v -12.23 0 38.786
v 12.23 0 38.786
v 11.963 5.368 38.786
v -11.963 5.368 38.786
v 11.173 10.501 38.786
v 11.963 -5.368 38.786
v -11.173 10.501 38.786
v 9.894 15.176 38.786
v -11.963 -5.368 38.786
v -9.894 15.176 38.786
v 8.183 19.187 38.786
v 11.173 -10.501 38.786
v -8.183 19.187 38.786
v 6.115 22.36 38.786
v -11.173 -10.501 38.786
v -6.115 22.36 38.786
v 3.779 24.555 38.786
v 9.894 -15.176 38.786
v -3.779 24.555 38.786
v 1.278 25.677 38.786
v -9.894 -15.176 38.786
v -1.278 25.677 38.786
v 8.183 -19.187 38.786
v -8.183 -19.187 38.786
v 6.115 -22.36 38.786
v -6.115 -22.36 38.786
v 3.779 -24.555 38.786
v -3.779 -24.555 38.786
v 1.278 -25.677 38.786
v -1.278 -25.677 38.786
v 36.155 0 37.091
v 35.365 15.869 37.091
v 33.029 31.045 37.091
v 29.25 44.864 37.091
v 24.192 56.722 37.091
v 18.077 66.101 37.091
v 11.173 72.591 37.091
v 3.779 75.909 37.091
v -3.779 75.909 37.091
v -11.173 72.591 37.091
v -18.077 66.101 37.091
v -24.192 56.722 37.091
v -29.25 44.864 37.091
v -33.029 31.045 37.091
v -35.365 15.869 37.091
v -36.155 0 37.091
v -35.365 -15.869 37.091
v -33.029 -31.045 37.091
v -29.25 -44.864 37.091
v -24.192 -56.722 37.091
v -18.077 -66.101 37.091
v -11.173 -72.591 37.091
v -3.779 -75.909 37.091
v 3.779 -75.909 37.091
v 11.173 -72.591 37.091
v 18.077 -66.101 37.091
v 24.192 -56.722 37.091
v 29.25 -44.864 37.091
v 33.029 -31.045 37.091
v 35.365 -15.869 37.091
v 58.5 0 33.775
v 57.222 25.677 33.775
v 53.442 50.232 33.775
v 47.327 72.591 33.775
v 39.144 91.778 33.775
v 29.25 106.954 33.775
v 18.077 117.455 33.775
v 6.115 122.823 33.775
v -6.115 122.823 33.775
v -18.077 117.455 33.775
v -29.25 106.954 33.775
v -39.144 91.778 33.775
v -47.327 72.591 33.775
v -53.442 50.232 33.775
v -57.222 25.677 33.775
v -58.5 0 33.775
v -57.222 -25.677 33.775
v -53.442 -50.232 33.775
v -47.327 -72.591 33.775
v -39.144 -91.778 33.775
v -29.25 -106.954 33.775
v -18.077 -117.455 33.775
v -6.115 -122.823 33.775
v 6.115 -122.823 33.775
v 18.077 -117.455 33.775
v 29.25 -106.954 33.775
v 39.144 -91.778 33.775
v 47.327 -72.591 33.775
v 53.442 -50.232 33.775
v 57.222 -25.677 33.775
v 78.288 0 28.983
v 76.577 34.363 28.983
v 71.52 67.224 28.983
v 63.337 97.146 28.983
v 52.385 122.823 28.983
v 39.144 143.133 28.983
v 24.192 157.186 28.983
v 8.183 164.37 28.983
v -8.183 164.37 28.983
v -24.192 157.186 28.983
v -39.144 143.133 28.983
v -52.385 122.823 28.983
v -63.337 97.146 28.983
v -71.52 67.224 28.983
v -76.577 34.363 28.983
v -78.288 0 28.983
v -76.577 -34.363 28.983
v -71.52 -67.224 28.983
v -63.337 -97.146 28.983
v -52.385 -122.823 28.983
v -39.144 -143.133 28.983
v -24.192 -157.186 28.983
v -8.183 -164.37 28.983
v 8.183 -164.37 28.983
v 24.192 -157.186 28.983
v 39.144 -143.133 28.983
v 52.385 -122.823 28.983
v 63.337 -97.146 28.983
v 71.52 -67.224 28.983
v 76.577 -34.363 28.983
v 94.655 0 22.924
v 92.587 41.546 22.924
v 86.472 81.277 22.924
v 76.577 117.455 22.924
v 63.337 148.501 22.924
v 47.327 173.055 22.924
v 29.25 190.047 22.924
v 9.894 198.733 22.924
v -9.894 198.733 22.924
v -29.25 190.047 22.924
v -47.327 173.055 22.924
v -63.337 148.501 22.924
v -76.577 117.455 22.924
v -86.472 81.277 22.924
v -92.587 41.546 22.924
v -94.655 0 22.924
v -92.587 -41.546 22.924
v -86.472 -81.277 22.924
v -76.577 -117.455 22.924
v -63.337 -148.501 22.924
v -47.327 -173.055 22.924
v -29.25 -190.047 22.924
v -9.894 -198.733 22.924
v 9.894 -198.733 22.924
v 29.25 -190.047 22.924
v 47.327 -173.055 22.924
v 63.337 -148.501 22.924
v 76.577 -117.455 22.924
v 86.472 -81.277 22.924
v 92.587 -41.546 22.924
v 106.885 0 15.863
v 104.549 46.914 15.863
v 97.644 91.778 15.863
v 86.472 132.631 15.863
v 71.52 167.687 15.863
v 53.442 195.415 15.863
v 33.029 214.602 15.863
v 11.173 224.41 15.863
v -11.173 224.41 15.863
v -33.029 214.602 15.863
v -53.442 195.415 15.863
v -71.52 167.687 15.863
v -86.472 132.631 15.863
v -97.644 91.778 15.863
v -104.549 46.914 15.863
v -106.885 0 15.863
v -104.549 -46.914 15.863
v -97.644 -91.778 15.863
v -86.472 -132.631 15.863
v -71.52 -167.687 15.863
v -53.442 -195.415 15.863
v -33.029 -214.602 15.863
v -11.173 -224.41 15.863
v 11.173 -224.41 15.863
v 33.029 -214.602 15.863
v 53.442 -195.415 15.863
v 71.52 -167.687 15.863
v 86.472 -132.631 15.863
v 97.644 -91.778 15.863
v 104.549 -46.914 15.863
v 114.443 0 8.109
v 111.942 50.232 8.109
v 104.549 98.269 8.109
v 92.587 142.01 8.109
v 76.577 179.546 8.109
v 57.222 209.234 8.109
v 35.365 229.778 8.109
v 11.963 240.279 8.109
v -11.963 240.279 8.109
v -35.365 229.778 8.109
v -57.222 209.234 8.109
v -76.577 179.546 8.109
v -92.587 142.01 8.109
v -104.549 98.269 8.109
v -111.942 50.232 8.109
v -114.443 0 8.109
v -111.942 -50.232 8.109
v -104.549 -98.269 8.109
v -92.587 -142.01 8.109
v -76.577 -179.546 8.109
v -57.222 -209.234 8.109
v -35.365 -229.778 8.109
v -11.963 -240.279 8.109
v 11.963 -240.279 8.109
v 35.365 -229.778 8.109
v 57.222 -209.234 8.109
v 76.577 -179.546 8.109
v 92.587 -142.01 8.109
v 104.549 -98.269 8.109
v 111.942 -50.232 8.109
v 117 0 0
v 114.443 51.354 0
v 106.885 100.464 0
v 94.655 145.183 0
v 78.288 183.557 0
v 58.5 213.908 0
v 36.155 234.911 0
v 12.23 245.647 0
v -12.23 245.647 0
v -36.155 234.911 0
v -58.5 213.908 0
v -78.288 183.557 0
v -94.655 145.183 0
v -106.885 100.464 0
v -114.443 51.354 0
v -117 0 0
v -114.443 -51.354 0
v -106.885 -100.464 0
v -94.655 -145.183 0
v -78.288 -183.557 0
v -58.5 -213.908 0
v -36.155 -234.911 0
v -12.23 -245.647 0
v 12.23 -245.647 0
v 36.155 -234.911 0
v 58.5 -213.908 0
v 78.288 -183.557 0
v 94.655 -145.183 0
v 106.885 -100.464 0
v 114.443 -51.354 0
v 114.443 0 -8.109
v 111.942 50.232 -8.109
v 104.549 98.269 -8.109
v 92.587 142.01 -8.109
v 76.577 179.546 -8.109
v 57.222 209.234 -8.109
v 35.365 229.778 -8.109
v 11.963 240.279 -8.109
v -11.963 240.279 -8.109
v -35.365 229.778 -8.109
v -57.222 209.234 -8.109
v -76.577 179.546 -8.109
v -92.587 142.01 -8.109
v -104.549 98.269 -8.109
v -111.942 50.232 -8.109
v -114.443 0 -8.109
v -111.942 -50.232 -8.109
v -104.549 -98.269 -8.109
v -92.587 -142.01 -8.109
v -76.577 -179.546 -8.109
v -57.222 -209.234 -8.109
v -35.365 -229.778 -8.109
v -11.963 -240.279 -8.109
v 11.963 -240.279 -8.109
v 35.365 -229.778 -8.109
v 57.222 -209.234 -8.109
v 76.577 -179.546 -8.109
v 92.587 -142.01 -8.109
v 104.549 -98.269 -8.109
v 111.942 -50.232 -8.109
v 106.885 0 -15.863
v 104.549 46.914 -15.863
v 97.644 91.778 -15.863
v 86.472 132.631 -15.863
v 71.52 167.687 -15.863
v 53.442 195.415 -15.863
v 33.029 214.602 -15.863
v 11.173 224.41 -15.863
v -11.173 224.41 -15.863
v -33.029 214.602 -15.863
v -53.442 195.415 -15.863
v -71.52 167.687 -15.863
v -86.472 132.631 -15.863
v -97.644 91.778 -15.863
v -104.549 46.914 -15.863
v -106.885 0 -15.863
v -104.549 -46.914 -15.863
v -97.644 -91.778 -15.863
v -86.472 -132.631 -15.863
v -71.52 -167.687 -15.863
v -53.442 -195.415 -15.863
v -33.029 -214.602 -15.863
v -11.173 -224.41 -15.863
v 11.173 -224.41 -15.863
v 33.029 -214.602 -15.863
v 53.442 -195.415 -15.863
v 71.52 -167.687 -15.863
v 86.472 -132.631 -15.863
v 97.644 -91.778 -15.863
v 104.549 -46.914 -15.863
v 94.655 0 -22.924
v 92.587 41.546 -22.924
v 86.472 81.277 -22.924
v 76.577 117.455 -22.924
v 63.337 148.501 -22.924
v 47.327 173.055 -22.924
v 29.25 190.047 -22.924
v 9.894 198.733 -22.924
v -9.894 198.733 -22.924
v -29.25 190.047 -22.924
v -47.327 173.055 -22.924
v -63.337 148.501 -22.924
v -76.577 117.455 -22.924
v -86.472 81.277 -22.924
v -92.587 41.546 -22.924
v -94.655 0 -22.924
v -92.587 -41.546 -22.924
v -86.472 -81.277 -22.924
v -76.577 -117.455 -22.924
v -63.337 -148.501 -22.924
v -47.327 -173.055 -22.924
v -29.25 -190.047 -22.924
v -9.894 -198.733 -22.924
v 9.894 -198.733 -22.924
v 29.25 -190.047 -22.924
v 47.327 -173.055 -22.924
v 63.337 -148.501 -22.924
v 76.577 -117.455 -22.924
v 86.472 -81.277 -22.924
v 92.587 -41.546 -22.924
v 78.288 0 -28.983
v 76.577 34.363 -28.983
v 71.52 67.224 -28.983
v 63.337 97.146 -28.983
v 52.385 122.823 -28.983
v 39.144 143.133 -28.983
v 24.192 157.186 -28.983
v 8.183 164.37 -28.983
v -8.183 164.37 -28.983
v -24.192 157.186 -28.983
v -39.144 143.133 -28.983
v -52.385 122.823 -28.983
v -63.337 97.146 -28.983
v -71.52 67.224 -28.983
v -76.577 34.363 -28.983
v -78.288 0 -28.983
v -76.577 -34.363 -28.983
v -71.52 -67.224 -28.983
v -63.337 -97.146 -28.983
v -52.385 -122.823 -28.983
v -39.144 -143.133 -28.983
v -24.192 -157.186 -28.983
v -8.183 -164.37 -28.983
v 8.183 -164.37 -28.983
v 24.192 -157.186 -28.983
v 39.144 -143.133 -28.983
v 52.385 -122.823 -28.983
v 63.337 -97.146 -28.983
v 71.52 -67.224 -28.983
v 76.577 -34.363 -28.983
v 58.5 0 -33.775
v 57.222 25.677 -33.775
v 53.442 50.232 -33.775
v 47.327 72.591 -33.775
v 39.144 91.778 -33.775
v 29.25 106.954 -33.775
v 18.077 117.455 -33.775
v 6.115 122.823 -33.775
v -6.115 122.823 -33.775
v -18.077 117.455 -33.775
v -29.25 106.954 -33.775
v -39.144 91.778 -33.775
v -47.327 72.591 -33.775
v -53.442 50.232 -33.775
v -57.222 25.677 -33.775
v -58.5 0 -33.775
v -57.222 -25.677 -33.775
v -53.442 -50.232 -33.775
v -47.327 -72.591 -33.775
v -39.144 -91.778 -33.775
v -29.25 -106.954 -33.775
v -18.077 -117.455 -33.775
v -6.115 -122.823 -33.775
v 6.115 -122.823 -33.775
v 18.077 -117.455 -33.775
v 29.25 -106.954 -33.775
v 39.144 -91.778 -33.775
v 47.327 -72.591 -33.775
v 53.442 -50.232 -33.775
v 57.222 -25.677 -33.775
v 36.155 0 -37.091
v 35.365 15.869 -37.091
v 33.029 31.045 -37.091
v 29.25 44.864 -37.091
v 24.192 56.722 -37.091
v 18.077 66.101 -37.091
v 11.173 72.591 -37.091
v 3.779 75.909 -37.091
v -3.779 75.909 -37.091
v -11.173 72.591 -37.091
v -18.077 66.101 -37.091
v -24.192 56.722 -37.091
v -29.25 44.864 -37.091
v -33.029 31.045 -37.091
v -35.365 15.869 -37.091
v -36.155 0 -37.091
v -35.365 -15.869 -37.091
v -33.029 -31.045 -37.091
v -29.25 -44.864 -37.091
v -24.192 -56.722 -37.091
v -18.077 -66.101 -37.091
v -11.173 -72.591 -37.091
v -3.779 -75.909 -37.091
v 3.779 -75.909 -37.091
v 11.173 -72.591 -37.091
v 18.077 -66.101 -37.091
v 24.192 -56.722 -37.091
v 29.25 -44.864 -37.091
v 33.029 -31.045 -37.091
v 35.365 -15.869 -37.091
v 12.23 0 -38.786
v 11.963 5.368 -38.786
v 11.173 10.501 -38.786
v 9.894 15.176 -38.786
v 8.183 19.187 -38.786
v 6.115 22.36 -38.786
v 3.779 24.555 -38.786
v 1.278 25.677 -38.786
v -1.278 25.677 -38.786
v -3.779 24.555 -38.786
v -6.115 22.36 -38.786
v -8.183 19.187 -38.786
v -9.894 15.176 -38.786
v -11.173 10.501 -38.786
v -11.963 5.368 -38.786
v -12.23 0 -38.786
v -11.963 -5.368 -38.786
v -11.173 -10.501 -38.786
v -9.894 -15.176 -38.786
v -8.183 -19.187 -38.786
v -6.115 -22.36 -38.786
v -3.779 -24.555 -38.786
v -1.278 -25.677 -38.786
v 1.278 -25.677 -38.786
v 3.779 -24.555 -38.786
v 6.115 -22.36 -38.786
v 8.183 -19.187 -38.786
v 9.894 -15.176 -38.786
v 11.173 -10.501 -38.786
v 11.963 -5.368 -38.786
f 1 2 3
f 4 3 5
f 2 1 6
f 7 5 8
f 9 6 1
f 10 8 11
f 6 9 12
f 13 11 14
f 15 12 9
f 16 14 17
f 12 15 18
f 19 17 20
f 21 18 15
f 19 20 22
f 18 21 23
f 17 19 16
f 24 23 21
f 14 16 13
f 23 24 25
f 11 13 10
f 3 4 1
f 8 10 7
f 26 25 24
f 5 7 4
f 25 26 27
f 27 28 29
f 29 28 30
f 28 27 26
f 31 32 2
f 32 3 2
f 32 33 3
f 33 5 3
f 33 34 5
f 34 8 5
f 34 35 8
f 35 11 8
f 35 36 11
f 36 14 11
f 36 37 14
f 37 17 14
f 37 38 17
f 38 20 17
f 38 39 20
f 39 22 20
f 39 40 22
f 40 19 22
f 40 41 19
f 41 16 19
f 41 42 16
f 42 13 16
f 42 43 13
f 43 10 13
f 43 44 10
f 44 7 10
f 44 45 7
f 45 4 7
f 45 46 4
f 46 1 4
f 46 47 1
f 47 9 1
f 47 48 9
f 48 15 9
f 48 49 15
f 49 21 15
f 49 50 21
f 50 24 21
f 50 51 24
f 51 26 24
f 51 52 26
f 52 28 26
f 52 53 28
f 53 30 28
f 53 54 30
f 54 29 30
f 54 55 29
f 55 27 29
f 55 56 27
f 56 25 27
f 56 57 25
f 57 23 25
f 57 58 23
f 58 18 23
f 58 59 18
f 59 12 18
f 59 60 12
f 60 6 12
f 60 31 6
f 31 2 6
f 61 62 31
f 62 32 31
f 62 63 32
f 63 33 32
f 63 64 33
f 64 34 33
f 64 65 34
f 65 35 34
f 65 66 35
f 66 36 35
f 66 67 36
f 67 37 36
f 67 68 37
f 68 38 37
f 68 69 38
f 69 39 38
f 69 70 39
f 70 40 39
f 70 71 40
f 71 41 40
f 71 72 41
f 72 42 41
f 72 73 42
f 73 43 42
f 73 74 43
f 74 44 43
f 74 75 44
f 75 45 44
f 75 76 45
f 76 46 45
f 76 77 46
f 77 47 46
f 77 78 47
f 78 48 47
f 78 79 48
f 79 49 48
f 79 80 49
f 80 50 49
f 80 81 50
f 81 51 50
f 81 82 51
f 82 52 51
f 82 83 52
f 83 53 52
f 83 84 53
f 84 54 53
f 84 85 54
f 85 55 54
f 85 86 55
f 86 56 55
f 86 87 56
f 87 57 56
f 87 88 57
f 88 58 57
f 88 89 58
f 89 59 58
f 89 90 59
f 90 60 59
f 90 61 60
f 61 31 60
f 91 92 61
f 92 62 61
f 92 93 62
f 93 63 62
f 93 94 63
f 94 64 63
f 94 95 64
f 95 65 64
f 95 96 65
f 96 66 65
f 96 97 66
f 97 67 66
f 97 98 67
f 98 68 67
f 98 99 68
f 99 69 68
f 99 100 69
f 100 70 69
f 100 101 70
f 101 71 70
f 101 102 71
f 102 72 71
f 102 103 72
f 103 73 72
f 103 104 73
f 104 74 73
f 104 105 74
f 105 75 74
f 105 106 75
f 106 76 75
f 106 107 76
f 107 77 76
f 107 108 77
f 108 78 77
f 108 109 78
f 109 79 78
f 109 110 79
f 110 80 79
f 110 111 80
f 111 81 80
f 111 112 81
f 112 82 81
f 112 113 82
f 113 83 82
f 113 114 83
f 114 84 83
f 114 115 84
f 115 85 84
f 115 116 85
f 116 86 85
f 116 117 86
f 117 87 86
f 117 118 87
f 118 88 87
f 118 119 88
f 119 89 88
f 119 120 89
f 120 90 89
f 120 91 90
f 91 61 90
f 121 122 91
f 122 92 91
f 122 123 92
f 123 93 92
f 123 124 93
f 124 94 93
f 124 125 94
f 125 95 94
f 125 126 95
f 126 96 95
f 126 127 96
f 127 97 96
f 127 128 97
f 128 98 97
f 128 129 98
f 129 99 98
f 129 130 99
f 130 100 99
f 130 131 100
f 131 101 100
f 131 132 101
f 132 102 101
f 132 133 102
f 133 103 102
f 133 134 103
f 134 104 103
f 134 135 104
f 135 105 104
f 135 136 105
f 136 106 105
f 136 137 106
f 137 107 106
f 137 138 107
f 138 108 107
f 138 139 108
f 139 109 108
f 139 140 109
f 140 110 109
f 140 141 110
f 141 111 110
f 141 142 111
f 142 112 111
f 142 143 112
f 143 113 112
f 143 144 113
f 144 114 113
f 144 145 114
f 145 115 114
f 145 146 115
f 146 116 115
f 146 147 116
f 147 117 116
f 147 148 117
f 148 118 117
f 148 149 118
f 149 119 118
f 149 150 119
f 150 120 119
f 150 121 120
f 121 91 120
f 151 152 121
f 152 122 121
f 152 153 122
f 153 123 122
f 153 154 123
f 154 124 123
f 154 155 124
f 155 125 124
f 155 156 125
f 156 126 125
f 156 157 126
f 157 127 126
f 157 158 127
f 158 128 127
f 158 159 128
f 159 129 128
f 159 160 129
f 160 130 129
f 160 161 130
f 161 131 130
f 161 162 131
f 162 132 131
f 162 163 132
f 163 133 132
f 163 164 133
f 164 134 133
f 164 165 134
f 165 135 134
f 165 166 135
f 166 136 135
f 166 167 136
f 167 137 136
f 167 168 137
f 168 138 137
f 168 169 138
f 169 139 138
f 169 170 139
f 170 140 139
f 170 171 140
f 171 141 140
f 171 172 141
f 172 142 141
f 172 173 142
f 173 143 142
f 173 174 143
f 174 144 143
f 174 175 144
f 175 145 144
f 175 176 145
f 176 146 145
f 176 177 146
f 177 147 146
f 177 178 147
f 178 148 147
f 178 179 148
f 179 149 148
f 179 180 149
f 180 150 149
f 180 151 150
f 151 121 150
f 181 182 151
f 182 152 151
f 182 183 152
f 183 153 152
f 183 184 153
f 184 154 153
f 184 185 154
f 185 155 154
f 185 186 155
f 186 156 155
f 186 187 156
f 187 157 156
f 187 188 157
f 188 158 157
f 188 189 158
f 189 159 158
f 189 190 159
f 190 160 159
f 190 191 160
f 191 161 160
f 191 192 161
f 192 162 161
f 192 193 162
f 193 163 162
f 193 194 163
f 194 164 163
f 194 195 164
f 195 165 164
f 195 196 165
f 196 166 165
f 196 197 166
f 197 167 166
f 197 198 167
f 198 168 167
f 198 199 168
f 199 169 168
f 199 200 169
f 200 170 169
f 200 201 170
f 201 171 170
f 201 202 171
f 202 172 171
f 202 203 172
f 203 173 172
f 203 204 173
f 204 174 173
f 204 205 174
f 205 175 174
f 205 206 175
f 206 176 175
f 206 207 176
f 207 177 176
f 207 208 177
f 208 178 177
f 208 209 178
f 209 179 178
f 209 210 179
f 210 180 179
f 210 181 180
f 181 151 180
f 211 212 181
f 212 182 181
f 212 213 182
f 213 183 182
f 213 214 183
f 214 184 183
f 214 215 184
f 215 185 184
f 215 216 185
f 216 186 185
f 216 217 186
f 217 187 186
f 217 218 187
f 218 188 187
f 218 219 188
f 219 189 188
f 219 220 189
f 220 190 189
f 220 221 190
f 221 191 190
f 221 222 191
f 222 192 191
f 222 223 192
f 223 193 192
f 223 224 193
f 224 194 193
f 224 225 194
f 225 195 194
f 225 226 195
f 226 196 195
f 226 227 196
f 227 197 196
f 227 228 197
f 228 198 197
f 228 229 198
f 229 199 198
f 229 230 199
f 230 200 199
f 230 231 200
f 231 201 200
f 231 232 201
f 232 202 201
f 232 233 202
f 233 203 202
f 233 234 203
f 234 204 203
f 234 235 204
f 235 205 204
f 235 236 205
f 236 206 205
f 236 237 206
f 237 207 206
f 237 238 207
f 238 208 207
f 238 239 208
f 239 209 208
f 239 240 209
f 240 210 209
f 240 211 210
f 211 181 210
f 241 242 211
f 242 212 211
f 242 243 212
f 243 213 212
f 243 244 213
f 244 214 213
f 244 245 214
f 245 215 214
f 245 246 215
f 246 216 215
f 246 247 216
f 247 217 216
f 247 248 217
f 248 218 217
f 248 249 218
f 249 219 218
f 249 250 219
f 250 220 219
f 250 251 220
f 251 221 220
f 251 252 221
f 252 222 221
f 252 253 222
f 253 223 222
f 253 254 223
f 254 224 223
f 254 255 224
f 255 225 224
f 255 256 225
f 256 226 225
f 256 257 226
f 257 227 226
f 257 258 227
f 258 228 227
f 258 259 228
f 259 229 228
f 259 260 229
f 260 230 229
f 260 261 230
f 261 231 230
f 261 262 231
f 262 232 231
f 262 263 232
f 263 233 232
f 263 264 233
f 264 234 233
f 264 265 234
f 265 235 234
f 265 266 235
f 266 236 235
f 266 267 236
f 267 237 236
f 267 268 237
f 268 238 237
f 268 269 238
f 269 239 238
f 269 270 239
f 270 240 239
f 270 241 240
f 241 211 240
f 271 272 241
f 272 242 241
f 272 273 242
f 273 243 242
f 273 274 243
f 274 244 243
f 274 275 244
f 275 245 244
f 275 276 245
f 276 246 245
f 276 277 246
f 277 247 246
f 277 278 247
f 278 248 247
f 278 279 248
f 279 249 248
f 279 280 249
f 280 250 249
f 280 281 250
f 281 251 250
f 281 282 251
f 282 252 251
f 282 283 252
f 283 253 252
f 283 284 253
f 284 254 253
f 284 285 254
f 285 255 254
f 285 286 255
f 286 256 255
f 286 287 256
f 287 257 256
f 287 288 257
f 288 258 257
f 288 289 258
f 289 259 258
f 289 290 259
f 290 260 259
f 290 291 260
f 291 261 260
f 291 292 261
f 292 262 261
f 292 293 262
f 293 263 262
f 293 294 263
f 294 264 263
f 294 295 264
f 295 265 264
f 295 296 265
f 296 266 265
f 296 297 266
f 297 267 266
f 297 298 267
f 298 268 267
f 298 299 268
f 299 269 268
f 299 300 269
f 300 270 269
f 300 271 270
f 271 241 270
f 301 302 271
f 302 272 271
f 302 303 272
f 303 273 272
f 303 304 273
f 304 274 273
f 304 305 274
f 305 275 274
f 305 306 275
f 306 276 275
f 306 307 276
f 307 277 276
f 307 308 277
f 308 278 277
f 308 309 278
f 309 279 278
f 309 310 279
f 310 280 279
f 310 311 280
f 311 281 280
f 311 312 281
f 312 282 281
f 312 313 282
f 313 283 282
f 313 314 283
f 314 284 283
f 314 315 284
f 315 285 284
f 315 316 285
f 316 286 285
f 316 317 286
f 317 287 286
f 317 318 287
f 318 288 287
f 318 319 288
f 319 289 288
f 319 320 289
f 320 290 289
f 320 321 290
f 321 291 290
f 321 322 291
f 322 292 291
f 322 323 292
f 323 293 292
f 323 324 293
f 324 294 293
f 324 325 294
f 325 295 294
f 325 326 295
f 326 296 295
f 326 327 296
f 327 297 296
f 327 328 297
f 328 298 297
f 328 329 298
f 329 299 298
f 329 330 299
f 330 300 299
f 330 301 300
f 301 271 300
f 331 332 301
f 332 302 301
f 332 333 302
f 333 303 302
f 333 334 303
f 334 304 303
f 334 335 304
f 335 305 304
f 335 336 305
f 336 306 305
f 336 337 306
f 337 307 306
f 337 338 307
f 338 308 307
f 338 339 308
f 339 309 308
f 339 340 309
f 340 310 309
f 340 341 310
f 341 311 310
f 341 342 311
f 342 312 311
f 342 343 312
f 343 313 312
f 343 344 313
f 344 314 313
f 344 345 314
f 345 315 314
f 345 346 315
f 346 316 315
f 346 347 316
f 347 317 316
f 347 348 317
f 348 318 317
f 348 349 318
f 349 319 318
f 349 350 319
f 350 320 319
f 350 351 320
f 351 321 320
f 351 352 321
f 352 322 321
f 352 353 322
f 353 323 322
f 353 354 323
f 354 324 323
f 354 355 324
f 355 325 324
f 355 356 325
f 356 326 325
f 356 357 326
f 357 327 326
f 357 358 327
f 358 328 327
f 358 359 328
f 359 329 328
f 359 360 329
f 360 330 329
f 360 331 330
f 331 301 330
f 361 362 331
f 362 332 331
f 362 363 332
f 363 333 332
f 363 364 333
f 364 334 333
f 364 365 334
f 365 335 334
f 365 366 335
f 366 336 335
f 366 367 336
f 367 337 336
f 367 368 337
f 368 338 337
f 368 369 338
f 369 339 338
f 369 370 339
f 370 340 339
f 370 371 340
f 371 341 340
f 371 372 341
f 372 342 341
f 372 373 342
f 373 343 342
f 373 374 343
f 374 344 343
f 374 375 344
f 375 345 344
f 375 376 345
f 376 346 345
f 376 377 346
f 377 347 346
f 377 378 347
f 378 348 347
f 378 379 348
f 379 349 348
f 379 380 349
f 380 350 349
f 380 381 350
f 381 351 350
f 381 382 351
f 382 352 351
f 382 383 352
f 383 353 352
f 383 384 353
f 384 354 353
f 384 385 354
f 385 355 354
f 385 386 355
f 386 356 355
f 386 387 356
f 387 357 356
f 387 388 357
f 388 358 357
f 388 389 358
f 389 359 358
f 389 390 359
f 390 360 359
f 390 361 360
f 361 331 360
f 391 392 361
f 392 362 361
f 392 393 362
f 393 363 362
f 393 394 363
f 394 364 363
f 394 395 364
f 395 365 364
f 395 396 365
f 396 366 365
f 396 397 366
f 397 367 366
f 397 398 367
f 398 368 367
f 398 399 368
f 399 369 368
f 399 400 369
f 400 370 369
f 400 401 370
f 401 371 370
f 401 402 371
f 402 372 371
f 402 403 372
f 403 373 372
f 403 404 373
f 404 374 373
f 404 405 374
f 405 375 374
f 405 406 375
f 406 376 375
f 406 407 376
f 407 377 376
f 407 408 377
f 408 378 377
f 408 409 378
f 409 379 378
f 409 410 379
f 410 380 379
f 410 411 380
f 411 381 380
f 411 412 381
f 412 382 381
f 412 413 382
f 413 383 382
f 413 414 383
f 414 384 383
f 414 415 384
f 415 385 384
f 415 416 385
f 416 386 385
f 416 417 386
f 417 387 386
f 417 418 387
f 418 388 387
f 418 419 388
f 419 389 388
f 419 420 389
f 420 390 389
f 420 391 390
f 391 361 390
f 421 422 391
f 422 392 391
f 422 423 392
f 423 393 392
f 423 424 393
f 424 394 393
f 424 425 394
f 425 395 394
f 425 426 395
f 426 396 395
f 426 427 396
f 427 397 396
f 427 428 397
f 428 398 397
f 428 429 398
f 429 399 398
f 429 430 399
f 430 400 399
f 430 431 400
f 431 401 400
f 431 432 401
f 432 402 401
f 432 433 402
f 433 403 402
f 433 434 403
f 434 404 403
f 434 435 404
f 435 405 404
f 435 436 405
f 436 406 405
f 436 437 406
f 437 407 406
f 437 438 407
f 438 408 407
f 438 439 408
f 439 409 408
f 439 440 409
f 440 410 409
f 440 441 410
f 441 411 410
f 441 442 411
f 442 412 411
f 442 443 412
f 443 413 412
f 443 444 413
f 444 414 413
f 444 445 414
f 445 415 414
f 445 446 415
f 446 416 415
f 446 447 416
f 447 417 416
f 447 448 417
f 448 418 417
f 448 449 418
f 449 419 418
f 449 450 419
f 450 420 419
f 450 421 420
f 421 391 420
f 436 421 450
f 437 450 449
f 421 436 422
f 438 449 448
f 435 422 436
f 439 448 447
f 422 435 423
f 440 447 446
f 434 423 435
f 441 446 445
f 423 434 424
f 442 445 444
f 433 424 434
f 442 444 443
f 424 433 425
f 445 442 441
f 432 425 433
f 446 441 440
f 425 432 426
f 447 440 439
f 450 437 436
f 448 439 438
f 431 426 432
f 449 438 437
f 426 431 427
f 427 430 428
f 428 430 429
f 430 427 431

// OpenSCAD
// Generated by SolidPython 1.0.1 on 2020-07-29 00:46:49


scale(v = [9, 19, 3]) {
	sphere(r = 13);
}
/***********************************************
*********      SolidPython code:      **********
************************************************
 
# import packages: SolidPython
from solid import *
from solid.utils import *
from itertools import chain, combinations, permutations


class Resize:

    def __init__(self, scad_file):
        self.scad_file = scad_file
        #self.scad_file = import_scad(scad_file)
        # cone/cylinder param:
        self.r1 = 0
        self.r2 = 0
        self.h = 0
        # rectangular prism param:
        self.w = 0
        self.l = 0
        # ellipse param:
        self.r = 0

    # import OpenScad code (file name corresponds to shape)


    # classify shape + parameters
    def assign(self, param1, param2, param3):
        if self.scad_file == 'cone.scad':
            self.r1 = param1
            self.r2 = param2
            self.h = param3
        elif self.scad_file == 'cylinder.scad':
            self.r1 = param1
            self.r2 = param2
            self.h = param3
        elif self.scad_file == 'rectangularPrism.scad':
            self.h = param1
            self.l = param2
            self.w = param3
        else:
            self.r = param1
            self.h = param2

    # resize parameters
    def iterate(self):
        x = range(3, 20, 2)
        i = 1
        if self.scad_file == 'cone.scad':
            tempList = list(permutations(x, 2))
            for temp in tempList:
                param1 = temp[0]
                param2 = temp[1]
                filepath = 'produced_scad_files/' + 'cone' + str(param1) + '_' + str(param2) + '_' + '.scad'
                scad_render_to_file(cylinder(h=param1, r1=param2, r2=0), filepath)

        elif self.scad_file == 'cylinder.scad':
            tempList = list(permutations(x, 3))
            for temp in tempList:
                param1 = temp[0]
                param2 = temp[1]
                filepath = 'produced_scad_files/' + 'cylinder' + str(param1) + '_' + str(param2) + '_' + '.scad'
                scad_render_to_file(cylinder(h=param1, r1=param2, r2=param2), filepath)

        elif self.scad_file == 'rectangularPrism.scad':
            tempList = list(permutations(x, 3))
            for temp in tempList:
                param1 = temp[0]
                param2 = temp[1]
                param3 = temp[2]
                filepath = 'produced_scad_files/' + 'rectangularPrism' + str(param1) + '_' + str(param2) + '_' + str(
                    param3) + '.scad'
                scad_render_to_file(cube(size=(param1, param2, param3)), filepath)

        elif self.scad_file == 'ellipse.scad':
            tempList = list(permutations(x, 4))
            for temp in tempList:
                param1 = temp[0]
                param2 = temp[1]
                param3 = temp[2]
                param4 = temp[3]
                filepath = 'produced_scad_files/' + 'ellipse' + str(param1) + '_' + str(param2) + '_' + str(param3) + '_' + str(param4) + '.scad'
                scad_render_to_file(scale([param1, param2, param3])(sphere(r=param4)), filepath)

    def render_to_scadfile(self):
        scad_render_to_file(scad, 'example.scad') 
 
************************************************/
